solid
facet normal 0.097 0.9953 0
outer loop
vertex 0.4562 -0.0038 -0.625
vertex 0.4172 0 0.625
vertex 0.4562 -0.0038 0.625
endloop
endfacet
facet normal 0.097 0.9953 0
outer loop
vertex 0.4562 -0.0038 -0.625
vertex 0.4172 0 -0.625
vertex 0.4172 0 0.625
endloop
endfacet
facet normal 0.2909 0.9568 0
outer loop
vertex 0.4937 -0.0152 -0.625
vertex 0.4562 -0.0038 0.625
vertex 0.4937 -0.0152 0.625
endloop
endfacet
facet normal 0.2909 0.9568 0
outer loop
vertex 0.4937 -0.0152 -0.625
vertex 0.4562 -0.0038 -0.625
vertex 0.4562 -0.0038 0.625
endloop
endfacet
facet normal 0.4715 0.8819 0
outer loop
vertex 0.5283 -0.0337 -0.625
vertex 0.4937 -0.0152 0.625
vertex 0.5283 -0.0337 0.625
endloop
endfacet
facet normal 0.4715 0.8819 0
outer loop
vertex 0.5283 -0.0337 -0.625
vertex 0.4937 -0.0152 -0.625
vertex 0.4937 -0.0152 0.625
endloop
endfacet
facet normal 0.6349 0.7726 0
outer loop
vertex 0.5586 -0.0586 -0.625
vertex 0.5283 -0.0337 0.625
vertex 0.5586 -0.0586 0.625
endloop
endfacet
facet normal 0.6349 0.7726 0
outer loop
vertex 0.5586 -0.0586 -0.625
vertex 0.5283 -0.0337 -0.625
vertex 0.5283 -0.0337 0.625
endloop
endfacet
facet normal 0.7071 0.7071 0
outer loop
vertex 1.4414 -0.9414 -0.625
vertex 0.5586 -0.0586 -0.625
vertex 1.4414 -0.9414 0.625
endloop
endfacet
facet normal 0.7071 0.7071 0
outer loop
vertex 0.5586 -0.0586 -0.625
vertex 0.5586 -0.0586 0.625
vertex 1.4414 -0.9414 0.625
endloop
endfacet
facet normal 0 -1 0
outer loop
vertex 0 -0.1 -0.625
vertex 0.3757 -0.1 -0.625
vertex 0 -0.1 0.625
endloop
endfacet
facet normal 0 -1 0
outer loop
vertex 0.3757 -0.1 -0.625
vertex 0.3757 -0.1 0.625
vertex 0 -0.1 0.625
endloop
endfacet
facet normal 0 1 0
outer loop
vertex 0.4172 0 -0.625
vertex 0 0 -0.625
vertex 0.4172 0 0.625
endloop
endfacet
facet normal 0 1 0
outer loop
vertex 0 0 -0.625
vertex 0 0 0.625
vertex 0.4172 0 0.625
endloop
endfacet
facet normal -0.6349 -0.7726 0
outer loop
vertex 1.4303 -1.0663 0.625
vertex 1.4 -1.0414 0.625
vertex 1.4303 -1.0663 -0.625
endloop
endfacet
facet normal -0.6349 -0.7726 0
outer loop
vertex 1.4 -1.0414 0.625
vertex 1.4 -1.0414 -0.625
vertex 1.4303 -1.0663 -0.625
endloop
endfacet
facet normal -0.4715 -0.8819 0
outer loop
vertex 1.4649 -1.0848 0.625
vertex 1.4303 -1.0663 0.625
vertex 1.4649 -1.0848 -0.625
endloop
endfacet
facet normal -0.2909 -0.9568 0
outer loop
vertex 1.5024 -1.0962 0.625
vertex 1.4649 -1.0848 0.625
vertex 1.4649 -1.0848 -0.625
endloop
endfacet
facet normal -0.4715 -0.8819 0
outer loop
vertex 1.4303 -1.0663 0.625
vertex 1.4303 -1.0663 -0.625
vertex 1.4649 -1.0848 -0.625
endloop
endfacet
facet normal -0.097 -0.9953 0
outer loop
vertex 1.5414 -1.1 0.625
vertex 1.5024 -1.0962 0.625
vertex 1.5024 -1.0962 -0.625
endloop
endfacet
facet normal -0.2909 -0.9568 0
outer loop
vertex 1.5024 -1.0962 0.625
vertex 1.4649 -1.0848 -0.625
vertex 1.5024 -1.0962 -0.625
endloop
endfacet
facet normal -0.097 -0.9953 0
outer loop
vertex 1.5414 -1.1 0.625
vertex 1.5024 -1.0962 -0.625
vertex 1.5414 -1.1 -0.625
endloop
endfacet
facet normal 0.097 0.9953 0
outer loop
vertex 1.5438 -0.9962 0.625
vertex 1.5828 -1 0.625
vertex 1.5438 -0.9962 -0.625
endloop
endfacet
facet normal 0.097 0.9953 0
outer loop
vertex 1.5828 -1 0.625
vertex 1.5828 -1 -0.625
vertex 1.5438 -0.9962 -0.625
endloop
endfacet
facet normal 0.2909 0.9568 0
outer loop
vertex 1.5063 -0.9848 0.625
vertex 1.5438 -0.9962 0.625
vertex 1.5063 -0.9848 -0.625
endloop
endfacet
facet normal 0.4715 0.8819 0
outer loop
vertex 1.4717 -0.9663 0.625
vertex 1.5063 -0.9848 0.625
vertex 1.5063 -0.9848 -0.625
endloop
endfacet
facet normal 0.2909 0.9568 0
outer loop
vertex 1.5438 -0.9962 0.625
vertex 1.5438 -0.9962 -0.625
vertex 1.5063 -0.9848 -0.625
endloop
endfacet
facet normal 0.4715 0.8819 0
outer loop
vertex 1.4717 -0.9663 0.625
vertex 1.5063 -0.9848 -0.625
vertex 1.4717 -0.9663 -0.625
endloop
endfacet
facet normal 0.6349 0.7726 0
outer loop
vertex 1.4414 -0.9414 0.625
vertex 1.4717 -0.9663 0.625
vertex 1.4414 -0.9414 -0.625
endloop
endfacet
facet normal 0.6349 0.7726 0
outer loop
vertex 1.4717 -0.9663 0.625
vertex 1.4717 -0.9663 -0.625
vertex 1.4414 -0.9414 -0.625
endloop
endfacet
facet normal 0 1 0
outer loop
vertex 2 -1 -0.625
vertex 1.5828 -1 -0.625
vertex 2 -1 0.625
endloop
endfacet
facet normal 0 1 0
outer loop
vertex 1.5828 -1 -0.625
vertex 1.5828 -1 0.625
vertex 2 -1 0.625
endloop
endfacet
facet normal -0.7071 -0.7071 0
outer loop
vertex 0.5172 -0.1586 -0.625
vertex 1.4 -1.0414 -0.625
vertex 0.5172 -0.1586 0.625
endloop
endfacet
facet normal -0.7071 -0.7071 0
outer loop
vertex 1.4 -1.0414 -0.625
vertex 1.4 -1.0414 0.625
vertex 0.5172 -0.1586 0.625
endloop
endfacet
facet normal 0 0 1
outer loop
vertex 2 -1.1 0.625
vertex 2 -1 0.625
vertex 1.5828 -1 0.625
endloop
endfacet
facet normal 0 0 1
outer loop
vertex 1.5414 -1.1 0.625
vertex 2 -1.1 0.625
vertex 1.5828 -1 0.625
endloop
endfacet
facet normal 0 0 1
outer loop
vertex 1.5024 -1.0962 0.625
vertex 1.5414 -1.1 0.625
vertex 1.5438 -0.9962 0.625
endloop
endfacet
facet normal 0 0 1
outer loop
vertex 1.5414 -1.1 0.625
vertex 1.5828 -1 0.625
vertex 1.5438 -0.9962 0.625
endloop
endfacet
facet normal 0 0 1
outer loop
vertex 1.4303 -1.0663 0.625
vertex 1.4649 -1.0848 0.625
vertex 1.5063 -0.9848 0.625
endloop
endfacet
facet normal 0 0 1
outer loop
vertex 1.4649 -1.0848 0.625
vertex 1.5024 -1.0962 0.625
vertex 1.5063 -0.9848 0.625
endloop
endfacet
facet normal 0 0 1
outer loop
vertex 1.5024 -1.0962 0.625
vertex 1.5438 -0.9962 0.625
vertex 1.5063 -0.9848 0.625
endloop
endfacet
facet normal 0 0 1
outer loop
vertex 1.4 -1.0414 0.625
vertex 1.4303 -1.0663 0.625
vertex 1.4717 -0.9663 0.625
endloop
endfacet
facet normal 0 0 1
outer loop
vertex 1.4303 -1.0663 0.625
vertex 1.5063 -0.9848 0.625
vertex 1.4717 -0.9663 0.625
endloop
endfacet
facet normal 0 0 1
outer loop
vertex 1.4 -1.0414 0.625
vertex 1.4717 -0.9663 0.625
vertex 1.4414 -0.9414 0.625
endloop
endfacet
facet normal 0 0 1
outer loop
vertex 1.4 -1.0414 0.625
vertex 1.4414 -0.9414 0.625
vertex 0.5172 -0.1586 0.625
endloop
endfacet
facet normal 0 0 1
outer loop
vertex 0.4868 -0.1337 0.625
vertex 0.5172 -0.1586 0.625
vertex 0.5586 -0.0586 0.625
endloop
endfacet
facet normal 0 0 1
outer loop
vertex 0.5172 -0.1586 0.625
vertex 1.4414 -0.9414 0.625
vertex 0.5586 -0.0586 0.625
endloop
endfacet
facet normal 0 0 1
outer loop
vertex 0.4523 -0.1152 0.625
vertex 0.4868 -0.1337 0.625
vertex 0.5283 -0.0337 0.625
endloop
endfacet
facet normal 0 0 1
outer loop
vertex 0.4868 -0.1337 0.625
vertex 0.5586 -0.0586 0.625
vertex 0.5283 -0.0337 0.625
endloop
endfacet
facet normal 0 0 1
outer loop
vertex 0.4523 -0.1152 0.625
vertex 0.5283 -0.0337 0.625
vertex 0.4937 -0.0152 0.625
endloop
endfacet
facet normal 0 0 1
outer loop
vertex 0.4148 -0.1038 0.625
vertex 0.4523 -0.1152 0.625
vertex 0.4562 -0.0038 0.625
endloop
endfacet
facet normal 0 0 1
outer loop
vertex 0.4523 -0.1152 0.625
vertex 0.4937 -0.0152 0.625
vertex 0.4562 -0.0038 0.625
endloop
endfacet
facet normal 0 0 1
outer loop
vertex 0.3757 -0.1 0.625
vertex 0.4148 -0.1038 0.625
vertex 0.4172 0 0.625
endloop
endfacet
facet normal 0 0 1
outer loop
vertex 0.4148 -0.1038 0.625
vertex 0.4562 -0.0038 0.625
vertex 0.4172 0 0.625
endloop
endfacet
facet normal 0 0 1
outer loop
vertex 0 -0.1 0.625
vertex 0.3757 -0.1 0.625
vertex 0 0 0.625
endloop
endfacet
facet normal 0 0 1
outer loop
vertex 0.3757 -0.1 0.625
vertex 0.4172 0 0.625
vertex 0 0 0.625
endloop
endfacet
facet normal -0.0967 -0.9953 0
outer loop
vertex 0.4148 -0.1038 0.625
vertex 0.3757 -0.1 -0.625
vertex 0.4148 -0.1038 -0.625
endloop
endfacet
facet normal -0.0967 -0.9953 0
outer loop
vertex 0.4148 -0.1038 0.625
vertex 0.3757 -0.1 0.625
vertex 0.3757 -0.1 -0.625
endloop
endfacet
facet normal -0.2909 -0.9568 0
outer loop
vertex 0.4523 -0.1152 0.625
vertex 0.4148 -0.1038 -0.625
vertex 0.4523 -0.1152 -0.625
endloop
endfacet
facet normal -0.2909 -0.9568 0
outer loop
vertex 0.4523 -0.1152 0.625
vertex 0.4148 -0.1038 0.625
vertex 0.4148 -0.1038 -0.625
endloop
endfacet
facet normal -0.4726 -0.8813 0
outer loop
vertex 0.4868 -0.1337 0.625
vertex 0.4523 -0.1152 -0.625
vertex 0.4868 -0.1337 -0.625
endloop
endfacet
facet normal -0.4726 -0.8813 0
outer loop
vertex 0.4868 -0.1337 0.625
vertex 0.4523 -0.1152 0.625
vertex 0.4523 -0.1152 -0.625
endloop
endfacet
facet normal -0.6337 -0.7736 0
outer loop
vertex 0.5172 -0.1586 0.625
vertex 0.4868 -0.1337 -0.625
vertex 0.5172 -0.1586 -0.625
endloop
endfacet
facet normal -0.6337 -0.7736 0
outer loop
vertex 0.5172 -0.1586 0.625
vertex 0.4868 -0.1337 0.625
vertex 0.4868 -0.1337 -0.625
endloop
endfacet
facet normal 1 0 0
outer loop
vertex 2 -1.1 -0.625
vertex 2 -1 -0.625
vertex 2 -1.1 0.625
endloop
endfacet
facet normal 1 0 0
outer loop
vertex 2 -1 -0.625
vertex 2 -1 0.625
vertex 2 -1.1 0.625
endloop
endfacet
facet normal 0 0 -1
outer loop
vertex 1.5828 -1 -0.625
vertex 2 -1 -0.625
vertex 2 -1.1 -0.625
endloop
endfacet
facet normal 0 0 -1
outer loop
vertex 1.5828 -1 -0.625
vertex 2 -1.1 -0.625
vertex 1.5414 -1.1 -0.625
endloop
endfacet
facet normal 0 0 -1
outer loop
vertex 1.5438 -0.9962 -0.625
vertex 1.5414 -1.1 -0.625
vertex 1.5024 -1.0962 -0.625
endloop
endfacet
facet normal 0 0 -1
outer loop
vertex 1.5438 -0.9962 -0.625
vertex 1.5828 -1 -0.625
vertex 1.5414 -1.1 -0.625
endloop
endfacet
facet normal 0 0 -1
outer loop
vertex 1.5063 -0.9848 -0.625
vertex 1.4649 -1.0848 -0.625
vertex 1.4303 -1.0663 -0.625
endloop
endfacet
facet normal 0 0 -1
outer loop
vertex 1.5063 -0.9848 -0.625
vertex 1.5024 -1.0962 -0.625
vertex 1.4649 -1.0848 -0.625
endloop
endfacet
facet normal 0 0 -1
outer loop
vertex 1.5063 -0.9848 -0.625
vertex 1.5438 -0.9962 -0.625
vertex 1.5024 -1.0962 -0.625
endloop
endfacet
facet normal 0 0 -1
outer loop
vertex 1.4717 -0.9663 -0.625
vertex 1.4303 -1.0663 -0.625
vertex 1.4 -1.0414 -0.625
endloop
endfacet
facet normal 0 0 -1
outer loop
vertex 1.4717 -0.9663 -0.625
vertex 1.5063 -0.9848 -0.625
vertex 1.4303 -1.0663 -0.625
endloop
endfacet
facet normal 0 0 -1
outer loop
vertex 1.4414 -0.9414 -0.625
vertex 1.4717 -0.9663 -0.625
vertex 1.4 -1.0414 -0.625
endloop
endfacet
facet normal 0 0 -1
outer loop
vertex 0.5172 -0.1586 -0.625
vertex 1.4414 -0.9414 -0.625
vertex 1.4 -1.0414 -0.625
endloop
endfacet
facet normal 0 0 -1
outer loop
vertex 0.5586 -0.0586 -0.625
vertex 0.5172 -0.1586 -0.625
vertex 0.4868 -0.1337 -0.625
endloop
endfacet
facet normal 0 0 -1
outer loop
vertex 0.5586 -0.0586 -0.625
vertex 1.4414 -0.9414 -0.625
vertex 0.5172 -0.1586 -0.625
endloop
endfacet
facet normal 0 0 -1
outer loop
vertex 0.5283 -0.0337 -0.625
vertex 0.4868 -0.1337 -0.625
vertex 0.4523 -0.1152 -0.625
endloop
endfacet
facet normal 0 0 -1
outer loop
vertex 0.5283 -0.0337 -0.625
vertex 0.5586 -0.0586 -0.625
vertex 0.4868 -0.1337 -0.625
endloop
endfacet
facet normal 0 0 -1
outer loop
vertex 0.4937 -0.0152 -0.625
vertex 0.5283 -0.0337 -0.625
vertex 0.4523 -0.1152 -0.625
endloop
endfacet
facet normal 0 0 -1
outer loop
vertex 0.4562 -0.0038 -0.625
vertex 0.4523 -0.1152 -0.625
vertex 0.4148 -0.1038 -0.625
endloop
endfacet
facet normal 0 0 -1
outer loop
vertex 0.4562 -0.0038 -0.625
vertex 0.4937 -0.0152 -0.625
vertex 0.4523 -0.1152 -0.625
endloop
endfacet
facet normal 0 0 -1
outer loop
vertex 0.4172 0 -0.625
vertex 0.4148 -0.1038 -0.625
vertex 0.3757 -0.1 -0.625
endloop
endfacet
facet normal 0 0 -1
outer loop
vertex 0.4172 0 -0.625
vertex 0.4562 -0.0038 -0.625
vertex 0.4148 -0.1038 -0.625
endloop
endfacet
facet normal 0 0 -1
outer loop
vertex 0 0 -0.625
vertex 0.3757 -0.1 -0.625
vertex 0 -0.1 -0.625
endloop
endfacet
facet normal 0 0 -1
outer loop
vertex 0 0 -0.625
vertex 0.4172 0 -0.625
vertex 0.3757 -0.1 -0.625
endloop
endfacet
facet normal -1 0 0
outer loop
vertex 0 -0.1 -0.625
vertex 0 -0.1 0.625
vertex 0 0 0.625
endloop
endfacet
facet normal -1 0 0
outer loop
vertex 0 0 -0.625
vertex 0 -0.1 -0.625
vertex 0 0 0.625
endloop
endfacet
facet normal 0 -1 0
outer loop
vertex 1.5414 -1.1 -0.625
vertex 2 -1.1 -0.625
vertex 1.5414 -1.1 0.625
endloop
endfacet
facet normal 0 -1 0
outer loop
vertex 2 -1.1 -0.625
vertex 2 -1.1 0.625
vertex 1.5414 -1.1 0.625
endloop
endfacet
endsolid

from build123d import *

# Parameters (mm, degrees)
BOSS_EXTRUDE1_DEPTH = 0.625
FILLET4_R           = 0.2


with BuildPart() as part:
    # Sketch4 → Boss-Extrude1 (new body, symmetric)
    with BuildSketch(Plane.XY):
        Polygon((0, 0), (0.5, 0), (1.5, -1), (2, -1), (2, -1.1), (1.458578644, -1.1), (0.458578644, -0.1), (0, -0.1), align=None)
    extrude(amount=BOSS_EXTRUDE1_DEPTH, both=True)

    # Fillet4
    fillet4_edges = [part.edges().sort_by_distance(p)[0] for p in [
        (0.5, 0, 0),
        (1.5, -1, 0),
        (1.458578644, -1.1, 0),
        (0.458578644, -0.1, 0),
    ]]
    fillet(fillet4_edges, radius=FILLET4_R)


solid = part.part
